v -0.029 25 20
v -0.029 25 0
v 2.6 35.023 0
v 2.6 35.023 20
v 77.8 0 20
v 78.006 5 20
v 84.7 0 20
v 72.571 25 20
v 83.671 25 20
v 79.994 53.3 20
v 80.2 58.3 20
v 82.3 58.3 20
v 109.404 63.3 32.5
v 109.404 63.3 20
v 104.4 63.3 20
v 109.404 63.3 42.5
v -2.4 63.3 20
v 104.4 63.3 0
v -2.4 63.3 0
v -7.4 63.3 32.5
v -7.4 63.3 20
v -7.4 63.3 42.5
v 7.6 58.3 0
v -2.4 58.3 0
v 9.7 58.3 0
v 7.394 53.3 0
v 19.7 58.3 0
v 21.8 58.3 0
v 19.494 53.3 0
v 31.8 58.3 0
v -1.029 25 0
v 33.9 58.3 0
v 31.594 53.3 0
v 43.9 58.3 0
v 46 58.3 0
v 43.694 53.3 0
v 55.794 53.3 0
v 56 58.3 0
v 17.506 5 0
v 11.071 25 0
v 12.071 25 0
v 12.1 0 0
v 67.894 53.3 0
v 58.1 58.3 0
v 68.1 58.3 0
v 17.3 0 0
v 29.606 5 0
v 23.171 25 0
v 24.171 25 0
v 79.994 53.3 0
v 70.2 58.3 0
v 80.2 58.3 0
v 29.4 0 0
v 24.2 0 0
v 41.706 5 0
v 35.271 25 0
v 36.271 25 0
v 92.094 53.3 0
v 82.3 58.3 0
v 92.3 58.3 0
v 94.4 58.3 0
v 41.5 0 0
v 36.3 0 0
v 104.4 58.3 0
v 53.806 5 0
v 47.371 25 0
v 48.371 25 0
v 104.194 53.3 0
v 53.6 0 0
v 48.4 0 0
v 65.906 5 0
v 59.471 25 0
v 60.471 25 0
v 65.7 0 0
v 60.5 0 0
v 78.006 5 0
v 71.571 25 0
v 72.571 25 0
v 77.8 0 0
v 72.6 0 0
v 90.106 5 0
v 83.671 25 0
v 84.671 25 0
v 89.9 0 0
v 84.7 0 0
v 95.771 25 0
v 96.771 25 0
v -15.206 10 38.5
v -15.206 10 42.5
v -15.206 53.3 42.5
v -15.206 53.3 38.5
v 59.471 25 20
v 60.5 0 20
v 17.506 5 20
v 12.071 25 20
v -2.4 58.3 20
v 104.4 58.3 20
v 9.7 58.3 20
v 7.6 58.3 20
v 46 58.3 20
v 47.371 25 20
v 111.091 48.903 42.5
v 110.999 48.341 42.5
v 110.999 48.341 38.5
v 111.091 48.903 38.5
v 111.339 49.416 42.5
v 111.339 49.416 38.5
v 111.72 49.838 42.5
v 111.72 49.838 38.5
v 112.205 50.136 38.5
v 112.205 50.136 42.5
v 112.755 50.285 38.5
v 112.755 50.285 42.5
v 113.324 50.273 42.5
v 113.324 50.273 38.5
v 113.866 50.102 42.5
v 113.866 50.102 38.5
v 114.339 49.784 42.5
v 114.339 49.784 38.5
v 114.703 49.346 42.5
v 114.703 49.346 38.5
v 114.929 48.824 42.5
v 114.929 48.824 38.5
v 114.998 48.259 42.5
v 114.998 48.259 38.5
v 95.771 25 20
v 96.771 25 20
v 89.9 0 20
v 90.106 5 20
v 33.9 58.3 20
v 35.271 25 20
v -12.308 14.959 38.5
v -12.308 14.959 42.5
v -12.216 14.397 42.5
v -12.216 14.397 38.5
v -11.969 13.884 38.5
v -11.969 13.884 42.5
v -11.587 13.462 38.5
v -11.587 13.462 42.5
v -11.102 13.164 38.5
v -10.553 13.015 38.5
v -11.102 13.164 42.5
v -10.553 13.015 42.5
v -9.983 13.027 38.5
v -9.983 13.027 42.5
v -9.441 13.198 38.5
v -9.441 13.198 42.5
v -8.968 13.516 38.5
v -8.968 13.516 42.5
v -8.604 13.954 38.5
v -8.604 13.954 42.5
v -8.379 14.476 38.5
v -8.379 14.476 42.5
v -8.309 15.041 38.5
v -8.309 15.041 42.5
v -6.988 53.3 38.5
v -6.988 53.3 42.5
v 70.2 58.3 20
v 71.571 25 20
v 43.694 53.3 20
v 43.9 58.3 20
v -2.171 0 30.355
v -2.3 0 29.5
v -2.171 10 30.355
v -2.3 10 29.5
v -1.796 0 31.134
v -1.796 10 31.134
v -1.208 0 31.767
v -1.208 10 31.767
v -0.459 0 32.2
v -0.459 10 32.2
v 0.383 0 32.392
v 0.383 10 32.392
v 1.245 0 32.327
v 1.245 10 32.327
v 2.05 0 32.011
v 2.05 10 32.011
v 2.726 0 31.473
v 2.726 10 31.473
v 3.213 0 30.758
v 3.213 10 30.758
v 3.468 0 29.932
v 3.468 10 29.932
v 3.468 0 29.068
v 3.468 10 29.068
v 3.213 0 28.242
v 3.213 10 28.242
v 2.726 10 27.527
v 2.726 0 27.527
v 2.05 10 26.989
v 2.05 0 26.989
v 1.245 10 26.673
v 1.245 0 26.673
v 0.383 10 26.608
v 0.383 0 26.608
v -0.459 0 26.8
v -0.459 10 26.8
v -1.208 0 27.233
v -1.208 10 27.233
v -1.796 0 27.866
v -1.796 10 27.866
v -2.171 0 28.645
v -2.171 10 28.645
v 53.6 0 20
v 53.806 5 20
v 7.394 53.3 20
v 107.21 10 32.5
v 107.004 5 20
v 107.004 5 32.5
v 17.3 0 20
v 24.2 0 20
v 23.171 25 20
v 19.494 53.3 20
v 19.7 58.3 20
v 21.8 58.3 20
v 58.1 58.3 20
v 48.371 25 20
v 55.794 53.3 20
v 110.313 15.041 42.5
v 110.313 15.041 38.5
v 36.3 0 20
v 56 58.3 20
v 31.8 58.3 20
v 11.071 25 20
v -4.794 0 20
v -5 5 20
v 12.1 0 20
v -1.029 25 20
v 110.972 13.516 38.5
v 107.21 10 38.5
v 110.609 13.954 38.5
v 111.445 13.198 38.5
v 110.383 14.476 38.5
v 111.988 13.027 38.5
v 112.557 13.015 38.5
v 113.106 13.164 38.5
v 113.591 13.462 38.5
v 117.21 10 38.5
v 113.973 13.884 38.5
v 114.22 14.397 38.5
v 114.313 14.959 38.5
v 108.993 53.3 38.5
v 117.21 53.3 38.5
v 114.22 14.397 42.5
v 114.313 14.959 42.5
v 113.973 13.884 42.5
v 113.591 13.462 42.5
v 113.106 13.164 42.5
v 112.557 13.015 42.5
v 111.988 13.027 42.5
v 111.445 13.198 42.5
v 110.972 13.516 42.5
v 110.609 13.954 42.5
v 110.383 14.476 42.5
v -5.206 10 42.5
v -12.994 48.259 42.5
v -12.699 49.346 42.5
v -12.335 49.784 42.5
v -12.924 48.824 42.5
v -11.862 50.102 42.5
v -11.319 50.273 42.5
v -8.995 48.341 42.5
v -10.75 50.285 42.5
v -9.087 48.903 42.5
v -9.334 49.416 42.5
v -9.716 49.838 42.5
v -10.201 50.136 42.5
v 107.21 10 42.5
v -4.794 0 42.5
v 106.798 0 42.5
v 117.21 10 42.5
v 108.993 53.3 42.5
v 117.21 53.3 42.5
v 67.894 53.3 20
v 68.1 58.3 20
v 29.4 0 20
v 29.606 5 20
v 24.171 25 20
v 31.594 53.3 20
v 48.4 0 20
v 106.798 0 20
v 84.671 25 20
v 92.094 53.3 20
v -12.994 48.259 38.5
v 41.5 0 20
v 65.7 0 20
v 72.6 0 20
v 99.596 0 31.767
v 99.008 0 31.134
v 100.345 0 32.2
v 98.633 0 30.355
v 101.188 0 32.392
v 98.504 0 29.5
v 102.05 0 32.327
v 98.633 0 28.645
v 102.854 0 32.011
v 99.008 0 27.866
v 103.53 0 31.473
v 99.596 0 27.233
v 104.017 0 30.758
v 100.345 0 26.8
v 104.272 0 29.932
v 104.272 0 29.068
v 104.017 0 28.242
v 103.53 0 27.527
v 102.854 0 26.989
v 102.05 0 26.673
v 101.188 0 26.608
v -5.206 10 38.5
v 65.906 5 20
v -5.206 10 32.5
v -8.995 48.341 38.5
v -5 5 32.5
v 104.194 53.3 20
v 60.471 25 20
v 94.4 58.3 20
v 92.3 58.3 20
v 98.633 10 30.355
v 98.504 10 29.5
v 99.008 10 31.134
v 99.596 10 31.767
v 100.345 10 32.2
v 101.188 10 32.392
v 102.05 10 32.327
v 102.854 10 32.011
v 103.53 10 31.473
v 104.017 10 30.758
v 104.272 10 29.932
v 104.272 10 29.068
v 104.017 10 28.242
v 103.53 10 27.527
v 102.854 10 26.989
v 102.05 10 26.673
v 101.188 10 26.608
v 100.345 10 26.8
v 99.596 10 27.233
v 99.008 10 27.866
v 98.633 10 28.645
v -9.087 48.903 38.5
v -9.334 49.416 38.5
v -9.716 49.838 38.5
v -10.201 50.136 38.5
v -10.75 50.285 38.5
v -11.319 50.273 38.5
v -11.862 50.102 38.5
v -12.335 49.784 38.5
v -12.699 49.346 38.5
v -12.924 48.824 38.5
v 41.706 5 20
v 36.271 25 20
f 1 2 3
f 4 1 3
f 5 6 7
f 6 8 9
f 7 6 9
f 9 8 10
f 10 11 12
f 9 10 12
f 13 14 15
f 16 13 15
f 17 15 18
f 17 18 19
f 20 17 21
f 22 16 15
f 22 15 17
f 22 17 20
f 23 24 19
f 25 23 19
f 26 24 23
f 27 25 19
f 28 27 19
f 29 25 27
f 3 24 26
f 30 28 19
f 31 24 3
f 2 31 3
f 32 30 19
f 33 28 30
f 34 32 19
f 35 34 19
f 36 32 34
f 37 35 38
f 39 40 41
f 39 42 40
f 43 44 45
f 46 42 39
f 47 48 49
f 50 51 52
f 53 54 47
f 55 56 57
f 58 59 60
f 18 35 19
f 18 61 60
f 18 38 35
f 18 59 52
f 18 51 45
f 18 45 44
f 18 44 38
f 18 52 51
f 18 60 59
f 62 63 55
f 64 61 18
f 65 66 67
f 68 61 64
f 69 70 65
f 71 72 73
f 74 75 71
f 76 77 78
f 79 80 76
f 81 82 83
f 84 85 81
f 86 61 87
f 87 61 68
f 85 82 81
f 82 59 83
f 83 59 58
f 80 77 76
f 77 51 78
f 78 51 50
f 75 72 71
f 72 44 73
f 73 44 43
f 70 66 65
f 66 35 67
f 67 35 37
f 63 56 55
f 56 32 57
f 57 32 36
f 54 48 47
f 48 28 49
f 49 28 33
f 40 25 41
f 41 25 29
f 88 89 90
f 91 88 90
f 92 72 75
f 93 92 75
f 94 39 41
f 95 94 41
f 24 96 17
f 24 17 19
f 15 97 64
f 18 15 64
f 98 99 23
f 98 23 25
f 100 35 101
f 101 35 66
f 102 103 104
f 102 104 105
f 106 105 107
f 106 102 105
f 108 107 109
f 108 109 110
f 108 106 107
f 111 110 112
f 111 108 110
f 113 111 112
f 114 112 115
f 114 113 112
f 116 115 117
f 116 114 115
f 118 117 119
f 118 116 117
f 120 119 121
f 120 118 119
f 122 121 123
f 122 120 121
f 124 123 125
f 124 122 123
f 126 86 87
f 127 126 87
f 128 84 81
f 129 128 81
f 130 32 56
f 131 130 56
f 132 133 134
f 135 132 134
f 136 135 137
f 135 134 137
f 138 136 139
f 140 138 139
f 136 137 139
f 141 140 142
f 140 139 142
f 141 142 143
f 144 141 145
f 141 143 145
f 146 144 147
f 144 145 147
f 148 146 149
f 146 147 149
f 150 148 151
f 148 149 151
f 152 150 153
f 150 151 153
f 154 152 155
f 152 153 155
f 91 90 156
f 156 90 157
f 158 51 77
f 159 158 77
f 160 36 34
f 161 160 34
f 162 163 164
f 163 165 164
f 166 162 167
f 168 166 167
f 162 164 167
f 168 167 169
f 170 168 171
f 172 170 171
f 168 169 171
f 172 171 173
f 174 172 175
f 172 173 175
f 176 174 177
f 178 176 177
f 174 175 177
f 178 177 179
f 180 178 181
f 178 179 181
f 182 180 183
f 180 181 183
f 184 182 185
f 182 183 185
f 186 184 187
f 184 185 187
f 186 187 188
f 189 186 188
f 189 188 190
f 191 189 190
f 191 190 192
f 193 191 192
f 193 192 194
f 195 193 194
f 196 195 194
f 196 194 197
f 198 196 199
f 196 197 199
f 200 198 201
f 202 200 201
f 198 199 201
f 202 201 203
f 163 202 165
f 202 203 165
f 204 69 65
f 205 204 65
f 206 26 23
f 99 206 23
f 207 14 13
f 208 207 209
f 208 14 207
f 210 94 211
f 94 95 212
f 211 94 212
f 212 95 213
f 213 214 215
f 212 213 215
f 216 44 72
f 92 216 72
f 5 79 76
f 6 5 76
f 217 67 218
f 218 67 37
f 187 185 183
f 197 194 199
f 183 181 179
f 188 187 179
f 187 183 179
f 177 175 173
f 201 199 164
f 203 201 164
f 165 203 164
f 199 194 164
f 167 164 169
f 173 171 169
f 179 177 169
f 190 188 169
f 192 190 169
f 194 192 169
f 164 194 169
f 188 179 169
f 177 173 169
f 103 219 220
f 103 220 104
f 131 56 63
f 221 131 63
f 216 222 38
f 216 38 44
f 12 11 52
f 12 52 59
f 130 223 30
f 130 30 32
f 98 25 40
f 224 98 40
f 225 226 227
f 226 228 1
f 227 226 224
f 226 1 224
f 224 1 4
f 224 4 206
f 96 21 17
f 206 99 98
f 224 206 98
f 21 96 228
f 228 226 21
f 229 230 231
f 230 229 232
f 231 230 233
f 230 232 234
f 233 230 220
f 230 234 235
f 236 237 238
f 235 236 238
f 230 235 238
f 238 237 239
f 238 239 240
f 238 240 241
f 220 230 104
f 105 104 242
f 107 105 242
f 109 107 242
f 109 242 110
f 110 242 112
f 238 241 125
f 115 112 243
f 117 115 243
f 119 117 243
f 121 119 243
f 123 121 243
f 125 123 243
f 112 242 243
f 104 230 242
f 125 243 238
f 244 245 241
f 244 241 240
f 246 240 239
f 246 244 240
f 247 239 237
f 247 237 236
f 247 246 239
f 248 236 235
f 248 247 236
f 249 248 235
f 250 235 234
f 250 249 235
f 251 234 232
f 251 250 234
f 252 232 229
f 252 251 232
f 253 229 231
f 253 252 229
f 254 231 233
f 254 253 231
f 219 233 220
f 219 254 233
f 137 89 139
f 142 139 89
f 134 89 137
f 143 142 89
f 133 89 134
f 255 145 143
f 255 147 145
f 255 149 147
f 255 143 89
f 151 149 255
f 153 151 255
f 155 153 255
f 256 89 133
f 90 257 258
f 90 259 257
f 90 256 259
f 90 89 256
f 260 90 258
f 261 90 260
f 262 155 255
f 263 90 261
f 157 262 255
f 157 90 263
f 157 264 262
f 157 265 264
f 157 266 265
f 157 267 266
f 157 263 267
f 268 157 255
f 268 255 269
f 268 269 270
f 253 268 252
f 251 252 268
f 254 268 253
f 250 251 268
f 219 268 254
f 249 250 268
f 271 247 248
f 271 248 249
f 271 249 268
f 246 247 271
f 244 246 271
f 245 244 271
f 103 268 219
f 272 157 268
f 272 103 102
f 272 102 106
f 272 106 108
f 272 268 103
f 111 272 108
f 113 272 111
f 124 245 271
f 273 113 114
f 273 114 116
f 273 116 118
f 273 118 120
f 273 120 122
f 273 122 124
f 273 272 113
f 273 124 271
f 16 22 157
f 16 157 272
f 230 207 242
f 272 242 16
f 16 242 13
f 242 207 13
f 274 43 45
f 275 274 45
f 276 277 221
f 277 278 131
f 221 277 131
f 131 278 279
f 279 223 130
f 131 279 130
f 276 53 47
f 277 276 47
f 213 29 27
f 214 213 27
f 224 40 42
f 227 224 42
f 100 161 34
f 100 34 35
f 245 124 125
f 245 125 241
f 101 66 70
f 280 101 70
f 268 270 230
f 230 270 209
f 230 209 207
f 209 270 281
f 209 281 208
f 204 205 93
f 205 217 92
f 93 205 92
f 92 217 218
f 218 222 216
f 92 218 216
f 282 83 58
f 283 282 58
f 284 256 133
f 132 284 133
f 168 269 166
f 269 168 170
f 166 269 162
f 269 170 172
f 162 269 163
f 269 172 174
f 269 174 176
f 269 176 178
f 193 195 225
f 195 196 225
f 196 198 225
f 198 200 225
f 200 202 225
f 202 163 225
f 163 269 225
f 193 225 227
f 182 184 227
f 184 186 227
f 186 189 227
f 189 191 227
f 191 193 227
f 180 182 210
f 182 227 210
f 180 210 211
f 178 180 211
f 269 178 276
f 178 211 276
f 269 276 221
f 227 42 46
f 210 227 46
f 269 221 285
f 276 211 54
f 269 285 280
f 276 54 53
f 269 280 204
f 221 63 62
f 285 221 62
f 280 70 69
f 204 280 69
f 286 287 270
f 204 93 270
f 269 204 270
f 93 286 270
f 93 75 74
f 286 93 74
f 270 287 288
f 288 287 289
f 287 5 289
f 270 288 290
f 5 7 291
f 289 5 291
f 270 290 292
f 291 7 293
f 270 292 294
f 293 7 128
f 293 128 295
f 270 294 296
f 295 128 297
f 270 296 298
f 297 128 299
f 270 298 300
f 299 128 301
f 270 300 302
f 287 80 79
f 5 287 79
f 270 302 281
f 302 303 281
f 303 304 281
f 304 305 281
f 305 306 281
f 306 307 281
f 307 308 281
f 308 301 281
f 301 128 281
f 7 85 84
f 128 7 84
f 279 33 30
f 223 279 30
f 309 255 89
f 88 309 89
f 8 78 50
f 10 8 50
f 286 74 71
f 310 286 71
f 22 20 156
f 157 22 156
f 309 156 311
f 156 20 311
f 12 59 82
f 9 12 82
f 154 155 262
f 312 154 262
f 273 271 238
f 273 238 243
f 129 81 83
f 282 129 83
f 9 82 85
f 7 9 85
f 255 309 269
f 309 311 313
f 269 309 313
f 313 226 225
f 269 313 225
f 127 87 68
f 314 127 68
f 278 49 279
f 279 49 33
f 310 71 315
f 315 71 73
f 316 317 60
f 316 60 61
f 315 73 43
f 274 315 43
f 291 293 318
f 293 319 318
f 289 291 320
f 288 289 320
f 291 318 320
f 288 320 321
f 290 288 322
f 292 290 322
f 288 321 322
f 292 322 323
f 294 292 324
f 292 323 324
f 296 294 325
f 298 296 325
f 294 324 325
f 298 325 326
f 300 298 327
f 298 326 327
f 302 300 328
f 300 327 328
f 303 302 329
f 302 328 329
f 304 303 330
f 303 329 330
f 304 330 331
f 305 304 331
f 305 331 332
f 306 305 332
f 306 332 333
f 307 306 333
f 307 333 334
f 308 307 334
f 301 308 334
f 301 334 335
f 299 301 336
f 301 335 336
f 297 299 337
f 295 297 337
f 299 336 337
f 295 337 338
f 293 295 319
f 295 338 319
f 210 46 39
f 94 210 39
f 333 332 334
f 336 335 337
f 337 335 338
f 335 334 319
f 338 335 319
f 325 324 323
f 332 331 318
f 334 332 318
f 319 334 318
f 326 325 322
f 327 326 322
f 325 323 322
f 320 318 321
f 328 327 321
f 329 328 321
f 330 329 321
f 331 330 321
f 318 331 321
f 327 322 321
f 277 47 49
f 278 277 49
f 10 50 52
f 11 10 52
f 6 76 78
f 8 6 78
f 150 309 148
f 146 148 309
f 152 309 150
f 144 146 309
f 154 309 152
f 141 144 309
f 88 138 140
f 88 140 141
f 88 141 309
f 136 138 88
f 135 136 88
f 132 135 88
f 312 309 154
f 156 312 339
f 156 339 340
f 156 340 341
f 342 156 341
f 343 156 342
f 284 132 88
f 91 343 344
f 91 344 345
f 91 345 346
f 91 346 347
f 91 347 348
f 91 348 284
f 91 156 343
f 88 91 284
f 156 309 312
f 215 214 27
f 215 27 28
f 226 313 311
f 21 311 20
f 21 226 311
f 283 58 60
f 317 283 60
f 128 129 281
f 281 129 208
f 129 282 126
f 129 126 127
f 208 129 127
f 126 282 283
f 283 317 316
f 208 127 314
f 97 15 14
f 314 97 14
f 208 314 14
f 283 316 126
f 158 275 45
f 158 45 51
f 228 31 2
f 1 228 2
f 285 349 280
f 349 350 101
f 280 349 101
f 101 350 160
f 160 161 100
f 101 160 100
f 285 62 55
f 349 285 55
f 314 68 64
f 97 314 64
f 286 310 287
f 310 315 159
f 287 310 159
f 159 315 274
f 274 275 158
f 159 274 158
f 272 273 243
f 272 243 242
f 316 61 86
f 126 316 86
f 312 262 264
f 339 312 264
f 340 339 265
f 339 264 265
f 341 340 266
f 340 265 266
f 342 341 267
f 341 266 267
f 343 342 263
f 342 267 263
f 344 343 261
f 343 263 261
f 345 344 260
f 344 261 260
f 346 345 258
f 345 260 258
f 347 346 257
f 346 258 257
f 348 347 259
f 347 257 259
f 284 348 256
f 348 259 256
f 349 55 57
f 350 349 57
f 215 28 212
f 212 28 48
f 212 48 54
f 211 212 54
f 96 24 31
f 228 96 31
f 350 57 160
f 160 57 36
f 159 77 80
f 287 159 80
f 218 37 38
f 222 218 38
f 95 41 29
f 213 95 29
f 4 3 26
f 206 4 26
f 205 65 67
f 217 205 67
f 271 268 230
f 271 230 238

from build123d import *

# Parameters (mm, degrees)
BOSS_EXTRUDE1_DEPTH = 20
SKETCH2_W           = 106.8
SKETCH2_H           = 20
BOSS_EXTRUDE2_DEPTH = 5
BOSS_EXTRUDE3_DEPTH = 12.5
SKETCH4_W           = 90.804234884
SKETCH4_H           = 53.3
BOSS_EXTRUDE4_DEPTH = 10
SKETCH7_R           = 2.9
CUT_EXTRUDE3_DEPTH  = 129.904719117
BOSS_EXTRUDE6_START = 53.3
SKETCH8_R           = 2.9
SKETCH8_W           = 10
SKETCH8_H           = 10
BOSS_EXTRUDE6_DEPTH = 53.3
BOSS_EXTRUDE7_DEPTH = 22.5
SKETCH12_R          = 2.9
CUT_EXTRUDE6_DEPTH  = 132.051236585
BOSS_EXTRUDE8_DEPTH = 4


with BuildPart() as part:
    # Sketch1 → Boss-Extrude1 (new body)
    with BuildSketch(Plane.XY):
        Polygon((-2.4, 58.3), (-1.02915952, 25), (-0.02915952, 25), (2.6, 35.023161884), (2.6, 58.3), align=None)
        Polygon((7.6, 58.3), (2.6, 58.3), (2.6, 35.023161884), (7.394168096, 53.3), align=None)
        Polygon((19.7, 58.3), (9.7, 58.3), (11.07084048, 25), (12.07084048, 25), (19.494168096, 53.3), align=None)
        Polygon((31.8, 58.3), (21.8, 58.3), (23.17084048, 25), (24.17084048, 25), (31.594168096, 53.3), align=None)
        Polygon((43.9, 58.3), (33.9, 58.3), (35.27084048, 25), (36.27084048, 25), (43.694168096, 53.3), align=None)
        Polygon((56, 58.3), (46, 58.3), (47.37084048, 25), (48.37084048, 25), (55.794168096, 53.3), align=None)
        Polygon((68.1, 58.3), (58.1, 58.3), (59.47084048, 25), (60.47084048, 25), (67.894168096, 53.3), align=None)
        Polygon((80.2, 58.3), (70.2, 58.3), (71.57084048, 25), (72.57084048, 25), (79.994168096, 53.3), align=None)
        Polygon((92.3, 58.3), (82.3, 58.3), (83.67084048, 25), (84.67084048, 25), (92.094168096, 53.3), align=None)
        Polygon((104.4, 58.3), (94.4, 58.3), (95.77084048, 25), (96.77084048, 25), (104.194168096, 53.3), align=None)
        Polygon((84.67084048, 25), (83.67084048, 25), (84.7, 0), (89.9, 0), (90.105831904, 5), align=None)
        Polygon((72.57084048, 25), (71.57084048, 25), (72.6, 0), (77.8, 0), (78.005831904, 5), align=None)
        Polygon((60.47084048, 25), (59.47084048, 25), (60.5, 0), (65.7, 0), (65.905831904, 5), align=None)
        Polygon((48.37084048, 25), (47.37084048, 25), (48.4, 0), (53.6, 0), (53.805831904, 5), align=None)
        Polygon((36.27084048, 25), (35.27084048, 25), (36.3, 0), (41.5, 0), (41.705831904, 5), align=None)
        Polygon((24.17084048, 25), (23.17084048, 25), (24.2, 0), (29.4, 0), (29.605831904, 5), align=None)
        Polygon((12.07084048, 25), (11.07084048, 25), (12.1, 0), (17.3, 0), (17.505831904, 5), align=None)
    extrude(amount=BOSS_EXTRUDE1_DEPTH)

    # Sketch2 → Boss-Extrude2 (add)
    with BuildSketch(Plane(origin=(0, 58.3, 0), x_dir=(1, 0, 0), z_dir=(0, 1, 0))):
        with Locations((51, -10)):
            Rectangle(SKETCH2_W, SKETCH2_H)
    extrude(amount=BOSS_EXTRUDE2_DEPTH)

    # Sketch3 → Boss-Extrude3 (add)
    with BuildSketch(Plane.XY.offset(20)):
        Polygon((109.404234884, 63.3), (107.004234884, 5), (-5, 5), (-7.4, 63.3), align=None)
    extrude(amount=BOSS_EXTRUDE3_DEPTH)

    # Sketch4 → Boss-Extrude4 (add)
    with BuildSketch(Plane.XY.offset(32.5)):
        Polygon((-5, 5), (107.004234884, 5), (107.210066788, 10), (106.404234884, 10), (96.404234884, 10), (5.6, 10), (-4.4, 10), (-5.205831904, 10), align=None)
        Polygon((-7.4, 63.3), (-5.205831904, 10), (-4.4, 10), (-4.4, 63.3), align=None)
        Polygon((107.210066788, 10), (109.404234884, 63.3), (106.404234884, 63.3), (106.404234884, 10), align=None)
        with Locations((51.002117442, 36.65)):
            Rectangle(SKETCH4_W, SKETCH4_H)
    extrude(amount=BOSS_EXTRUDE4_DEPTH)

    # Sketch7 → Cut-Extrude3 (cut, through all)
    with BuildSketch(Plane(origin=(0, 10, 0), x_dir=(1, 0, 0), z_dir=(0, 1, 0))):
        with Locations(Location((101.404234884, -29.5, 0), (0, 0, 180))):
            Circle(SKETCH7_R)
        with Locations(Location((0.6, -29.5, 0), (0, 0, 180))):
            Circle(SKETCH7_R)
    extrude(amount=-CUT_EXTRUDE3_DEPTH, mode=Mode.SUBTRACT)

    # Sketch8 → Boss-Extrude6 (add)
    with BuildSketch(Plane(origin=(0, 10, 0), x_dir=(1, 0, 0), z_dir=(0, 1, 0)).offset(BOSS_EXTRUDE6_START)):
        with Locations(Location((101.404234884, -29.5, 0), (0, 0, 180))):
            Circle(SKETCH8_R)
        with Locations(Location((0.6, -29.5, 0), (0, 0, 180))):
            Circle(SKETCH8_R)
        with Locations((101.404234884, -37.5)):
            Rectangle(SKETCH8_W, SKETCH8_H)
        with Locations((0.6, -37.5)):
            Rectangle(SKETCH8_W, SKETCH8_H)
    extrude(amount=-BOSS_EXTRUDE6_DEPTH)

    # Sketch10 → Boss-Extrude7 (add)
    with BuildSketch(Plane.XY.offset(20)):
        Polygon((-5, 5), (-4.794168096, 0), (106.79840298, 0), (107.004234884, 5), align=None)
    extrude(amount=BOSS_EXTRUDE7_DEPTH)

    # Sketch12 → Cut-Extrude6 (cut, through all)
    with BuildSketch(Plane(origin=(0, 5, 0), x_dir=(1, 0, 0), z_dir=(0, 1, 0))):
        with Locations(Location((101.404234884, -29.5, 0), (0, 0, 180))):
            Circle(SKETCH12_R)
        with Locations(Location((0.6, -29.5, 0), (0, 0, 180))):
            Circle(SKETCH12_R)
    extrude(amount=-CUT_EXTRUDE6_DEPTH, mode=Mode.SUBTRACT)

    # Sketch13 → Boss-Extrude8 (add)
    # profile 1 of 2: a face of its own
    with BuildSketch(Plane.XY.offset(42.5)):
        Polygon((108.992571076, 53.3), (107.210066788, 10), (117.210066788, 10), (117.210066788, 53.3), align=None)
        with BuildLine():
            Line((110.313406273, 15.041157663), (110.998826513, 48.341157663))
            ThreePointArc((110.998826513, 48.341157663), (113.039560643, 50.299576467), (114.997979447, 48.258842337))
            Line((114.997979447, 48.258842337), (114.312559207, 14.958842337))
            ThreePointArc((114.312559207, 14.958842337), (112.271825077, 13.000423533), (110.313406273, 15.041157663))
        make_face(mode=Mode.SUBTRACT)
    # profile 2 of 2: a face of its own
    with BuildSketch(Plane.XY.offset(42.5)):
        Polygon((-15.205831904, 10), (-15.205831904, 53.3), (-6.988336192, 53.3), (-5.205831904, 10), align=None)
        with BuildLine():
            Line((-8.309171389, 15.041157663), (-8.994591629, 48.341157663))
            ThreePointArc((-8.994591629, 48.341157663), (-11.035325759, 50.299576467), (-12.993744563, 48.258842337))
            Line((-12.993744563, 48.258842337), (-12.308324323, 14.958842337))
            ThreePointArc((-12.308324323, 14.958842337), (-10.267590193, 13.000423533), (-8.309171389, 15.041157663))
        make_face(mode=Mode.SUBTRACT)
    extrude(amount=-BOSS_EXTRUDE8_DEPTH)


solid = part.part
